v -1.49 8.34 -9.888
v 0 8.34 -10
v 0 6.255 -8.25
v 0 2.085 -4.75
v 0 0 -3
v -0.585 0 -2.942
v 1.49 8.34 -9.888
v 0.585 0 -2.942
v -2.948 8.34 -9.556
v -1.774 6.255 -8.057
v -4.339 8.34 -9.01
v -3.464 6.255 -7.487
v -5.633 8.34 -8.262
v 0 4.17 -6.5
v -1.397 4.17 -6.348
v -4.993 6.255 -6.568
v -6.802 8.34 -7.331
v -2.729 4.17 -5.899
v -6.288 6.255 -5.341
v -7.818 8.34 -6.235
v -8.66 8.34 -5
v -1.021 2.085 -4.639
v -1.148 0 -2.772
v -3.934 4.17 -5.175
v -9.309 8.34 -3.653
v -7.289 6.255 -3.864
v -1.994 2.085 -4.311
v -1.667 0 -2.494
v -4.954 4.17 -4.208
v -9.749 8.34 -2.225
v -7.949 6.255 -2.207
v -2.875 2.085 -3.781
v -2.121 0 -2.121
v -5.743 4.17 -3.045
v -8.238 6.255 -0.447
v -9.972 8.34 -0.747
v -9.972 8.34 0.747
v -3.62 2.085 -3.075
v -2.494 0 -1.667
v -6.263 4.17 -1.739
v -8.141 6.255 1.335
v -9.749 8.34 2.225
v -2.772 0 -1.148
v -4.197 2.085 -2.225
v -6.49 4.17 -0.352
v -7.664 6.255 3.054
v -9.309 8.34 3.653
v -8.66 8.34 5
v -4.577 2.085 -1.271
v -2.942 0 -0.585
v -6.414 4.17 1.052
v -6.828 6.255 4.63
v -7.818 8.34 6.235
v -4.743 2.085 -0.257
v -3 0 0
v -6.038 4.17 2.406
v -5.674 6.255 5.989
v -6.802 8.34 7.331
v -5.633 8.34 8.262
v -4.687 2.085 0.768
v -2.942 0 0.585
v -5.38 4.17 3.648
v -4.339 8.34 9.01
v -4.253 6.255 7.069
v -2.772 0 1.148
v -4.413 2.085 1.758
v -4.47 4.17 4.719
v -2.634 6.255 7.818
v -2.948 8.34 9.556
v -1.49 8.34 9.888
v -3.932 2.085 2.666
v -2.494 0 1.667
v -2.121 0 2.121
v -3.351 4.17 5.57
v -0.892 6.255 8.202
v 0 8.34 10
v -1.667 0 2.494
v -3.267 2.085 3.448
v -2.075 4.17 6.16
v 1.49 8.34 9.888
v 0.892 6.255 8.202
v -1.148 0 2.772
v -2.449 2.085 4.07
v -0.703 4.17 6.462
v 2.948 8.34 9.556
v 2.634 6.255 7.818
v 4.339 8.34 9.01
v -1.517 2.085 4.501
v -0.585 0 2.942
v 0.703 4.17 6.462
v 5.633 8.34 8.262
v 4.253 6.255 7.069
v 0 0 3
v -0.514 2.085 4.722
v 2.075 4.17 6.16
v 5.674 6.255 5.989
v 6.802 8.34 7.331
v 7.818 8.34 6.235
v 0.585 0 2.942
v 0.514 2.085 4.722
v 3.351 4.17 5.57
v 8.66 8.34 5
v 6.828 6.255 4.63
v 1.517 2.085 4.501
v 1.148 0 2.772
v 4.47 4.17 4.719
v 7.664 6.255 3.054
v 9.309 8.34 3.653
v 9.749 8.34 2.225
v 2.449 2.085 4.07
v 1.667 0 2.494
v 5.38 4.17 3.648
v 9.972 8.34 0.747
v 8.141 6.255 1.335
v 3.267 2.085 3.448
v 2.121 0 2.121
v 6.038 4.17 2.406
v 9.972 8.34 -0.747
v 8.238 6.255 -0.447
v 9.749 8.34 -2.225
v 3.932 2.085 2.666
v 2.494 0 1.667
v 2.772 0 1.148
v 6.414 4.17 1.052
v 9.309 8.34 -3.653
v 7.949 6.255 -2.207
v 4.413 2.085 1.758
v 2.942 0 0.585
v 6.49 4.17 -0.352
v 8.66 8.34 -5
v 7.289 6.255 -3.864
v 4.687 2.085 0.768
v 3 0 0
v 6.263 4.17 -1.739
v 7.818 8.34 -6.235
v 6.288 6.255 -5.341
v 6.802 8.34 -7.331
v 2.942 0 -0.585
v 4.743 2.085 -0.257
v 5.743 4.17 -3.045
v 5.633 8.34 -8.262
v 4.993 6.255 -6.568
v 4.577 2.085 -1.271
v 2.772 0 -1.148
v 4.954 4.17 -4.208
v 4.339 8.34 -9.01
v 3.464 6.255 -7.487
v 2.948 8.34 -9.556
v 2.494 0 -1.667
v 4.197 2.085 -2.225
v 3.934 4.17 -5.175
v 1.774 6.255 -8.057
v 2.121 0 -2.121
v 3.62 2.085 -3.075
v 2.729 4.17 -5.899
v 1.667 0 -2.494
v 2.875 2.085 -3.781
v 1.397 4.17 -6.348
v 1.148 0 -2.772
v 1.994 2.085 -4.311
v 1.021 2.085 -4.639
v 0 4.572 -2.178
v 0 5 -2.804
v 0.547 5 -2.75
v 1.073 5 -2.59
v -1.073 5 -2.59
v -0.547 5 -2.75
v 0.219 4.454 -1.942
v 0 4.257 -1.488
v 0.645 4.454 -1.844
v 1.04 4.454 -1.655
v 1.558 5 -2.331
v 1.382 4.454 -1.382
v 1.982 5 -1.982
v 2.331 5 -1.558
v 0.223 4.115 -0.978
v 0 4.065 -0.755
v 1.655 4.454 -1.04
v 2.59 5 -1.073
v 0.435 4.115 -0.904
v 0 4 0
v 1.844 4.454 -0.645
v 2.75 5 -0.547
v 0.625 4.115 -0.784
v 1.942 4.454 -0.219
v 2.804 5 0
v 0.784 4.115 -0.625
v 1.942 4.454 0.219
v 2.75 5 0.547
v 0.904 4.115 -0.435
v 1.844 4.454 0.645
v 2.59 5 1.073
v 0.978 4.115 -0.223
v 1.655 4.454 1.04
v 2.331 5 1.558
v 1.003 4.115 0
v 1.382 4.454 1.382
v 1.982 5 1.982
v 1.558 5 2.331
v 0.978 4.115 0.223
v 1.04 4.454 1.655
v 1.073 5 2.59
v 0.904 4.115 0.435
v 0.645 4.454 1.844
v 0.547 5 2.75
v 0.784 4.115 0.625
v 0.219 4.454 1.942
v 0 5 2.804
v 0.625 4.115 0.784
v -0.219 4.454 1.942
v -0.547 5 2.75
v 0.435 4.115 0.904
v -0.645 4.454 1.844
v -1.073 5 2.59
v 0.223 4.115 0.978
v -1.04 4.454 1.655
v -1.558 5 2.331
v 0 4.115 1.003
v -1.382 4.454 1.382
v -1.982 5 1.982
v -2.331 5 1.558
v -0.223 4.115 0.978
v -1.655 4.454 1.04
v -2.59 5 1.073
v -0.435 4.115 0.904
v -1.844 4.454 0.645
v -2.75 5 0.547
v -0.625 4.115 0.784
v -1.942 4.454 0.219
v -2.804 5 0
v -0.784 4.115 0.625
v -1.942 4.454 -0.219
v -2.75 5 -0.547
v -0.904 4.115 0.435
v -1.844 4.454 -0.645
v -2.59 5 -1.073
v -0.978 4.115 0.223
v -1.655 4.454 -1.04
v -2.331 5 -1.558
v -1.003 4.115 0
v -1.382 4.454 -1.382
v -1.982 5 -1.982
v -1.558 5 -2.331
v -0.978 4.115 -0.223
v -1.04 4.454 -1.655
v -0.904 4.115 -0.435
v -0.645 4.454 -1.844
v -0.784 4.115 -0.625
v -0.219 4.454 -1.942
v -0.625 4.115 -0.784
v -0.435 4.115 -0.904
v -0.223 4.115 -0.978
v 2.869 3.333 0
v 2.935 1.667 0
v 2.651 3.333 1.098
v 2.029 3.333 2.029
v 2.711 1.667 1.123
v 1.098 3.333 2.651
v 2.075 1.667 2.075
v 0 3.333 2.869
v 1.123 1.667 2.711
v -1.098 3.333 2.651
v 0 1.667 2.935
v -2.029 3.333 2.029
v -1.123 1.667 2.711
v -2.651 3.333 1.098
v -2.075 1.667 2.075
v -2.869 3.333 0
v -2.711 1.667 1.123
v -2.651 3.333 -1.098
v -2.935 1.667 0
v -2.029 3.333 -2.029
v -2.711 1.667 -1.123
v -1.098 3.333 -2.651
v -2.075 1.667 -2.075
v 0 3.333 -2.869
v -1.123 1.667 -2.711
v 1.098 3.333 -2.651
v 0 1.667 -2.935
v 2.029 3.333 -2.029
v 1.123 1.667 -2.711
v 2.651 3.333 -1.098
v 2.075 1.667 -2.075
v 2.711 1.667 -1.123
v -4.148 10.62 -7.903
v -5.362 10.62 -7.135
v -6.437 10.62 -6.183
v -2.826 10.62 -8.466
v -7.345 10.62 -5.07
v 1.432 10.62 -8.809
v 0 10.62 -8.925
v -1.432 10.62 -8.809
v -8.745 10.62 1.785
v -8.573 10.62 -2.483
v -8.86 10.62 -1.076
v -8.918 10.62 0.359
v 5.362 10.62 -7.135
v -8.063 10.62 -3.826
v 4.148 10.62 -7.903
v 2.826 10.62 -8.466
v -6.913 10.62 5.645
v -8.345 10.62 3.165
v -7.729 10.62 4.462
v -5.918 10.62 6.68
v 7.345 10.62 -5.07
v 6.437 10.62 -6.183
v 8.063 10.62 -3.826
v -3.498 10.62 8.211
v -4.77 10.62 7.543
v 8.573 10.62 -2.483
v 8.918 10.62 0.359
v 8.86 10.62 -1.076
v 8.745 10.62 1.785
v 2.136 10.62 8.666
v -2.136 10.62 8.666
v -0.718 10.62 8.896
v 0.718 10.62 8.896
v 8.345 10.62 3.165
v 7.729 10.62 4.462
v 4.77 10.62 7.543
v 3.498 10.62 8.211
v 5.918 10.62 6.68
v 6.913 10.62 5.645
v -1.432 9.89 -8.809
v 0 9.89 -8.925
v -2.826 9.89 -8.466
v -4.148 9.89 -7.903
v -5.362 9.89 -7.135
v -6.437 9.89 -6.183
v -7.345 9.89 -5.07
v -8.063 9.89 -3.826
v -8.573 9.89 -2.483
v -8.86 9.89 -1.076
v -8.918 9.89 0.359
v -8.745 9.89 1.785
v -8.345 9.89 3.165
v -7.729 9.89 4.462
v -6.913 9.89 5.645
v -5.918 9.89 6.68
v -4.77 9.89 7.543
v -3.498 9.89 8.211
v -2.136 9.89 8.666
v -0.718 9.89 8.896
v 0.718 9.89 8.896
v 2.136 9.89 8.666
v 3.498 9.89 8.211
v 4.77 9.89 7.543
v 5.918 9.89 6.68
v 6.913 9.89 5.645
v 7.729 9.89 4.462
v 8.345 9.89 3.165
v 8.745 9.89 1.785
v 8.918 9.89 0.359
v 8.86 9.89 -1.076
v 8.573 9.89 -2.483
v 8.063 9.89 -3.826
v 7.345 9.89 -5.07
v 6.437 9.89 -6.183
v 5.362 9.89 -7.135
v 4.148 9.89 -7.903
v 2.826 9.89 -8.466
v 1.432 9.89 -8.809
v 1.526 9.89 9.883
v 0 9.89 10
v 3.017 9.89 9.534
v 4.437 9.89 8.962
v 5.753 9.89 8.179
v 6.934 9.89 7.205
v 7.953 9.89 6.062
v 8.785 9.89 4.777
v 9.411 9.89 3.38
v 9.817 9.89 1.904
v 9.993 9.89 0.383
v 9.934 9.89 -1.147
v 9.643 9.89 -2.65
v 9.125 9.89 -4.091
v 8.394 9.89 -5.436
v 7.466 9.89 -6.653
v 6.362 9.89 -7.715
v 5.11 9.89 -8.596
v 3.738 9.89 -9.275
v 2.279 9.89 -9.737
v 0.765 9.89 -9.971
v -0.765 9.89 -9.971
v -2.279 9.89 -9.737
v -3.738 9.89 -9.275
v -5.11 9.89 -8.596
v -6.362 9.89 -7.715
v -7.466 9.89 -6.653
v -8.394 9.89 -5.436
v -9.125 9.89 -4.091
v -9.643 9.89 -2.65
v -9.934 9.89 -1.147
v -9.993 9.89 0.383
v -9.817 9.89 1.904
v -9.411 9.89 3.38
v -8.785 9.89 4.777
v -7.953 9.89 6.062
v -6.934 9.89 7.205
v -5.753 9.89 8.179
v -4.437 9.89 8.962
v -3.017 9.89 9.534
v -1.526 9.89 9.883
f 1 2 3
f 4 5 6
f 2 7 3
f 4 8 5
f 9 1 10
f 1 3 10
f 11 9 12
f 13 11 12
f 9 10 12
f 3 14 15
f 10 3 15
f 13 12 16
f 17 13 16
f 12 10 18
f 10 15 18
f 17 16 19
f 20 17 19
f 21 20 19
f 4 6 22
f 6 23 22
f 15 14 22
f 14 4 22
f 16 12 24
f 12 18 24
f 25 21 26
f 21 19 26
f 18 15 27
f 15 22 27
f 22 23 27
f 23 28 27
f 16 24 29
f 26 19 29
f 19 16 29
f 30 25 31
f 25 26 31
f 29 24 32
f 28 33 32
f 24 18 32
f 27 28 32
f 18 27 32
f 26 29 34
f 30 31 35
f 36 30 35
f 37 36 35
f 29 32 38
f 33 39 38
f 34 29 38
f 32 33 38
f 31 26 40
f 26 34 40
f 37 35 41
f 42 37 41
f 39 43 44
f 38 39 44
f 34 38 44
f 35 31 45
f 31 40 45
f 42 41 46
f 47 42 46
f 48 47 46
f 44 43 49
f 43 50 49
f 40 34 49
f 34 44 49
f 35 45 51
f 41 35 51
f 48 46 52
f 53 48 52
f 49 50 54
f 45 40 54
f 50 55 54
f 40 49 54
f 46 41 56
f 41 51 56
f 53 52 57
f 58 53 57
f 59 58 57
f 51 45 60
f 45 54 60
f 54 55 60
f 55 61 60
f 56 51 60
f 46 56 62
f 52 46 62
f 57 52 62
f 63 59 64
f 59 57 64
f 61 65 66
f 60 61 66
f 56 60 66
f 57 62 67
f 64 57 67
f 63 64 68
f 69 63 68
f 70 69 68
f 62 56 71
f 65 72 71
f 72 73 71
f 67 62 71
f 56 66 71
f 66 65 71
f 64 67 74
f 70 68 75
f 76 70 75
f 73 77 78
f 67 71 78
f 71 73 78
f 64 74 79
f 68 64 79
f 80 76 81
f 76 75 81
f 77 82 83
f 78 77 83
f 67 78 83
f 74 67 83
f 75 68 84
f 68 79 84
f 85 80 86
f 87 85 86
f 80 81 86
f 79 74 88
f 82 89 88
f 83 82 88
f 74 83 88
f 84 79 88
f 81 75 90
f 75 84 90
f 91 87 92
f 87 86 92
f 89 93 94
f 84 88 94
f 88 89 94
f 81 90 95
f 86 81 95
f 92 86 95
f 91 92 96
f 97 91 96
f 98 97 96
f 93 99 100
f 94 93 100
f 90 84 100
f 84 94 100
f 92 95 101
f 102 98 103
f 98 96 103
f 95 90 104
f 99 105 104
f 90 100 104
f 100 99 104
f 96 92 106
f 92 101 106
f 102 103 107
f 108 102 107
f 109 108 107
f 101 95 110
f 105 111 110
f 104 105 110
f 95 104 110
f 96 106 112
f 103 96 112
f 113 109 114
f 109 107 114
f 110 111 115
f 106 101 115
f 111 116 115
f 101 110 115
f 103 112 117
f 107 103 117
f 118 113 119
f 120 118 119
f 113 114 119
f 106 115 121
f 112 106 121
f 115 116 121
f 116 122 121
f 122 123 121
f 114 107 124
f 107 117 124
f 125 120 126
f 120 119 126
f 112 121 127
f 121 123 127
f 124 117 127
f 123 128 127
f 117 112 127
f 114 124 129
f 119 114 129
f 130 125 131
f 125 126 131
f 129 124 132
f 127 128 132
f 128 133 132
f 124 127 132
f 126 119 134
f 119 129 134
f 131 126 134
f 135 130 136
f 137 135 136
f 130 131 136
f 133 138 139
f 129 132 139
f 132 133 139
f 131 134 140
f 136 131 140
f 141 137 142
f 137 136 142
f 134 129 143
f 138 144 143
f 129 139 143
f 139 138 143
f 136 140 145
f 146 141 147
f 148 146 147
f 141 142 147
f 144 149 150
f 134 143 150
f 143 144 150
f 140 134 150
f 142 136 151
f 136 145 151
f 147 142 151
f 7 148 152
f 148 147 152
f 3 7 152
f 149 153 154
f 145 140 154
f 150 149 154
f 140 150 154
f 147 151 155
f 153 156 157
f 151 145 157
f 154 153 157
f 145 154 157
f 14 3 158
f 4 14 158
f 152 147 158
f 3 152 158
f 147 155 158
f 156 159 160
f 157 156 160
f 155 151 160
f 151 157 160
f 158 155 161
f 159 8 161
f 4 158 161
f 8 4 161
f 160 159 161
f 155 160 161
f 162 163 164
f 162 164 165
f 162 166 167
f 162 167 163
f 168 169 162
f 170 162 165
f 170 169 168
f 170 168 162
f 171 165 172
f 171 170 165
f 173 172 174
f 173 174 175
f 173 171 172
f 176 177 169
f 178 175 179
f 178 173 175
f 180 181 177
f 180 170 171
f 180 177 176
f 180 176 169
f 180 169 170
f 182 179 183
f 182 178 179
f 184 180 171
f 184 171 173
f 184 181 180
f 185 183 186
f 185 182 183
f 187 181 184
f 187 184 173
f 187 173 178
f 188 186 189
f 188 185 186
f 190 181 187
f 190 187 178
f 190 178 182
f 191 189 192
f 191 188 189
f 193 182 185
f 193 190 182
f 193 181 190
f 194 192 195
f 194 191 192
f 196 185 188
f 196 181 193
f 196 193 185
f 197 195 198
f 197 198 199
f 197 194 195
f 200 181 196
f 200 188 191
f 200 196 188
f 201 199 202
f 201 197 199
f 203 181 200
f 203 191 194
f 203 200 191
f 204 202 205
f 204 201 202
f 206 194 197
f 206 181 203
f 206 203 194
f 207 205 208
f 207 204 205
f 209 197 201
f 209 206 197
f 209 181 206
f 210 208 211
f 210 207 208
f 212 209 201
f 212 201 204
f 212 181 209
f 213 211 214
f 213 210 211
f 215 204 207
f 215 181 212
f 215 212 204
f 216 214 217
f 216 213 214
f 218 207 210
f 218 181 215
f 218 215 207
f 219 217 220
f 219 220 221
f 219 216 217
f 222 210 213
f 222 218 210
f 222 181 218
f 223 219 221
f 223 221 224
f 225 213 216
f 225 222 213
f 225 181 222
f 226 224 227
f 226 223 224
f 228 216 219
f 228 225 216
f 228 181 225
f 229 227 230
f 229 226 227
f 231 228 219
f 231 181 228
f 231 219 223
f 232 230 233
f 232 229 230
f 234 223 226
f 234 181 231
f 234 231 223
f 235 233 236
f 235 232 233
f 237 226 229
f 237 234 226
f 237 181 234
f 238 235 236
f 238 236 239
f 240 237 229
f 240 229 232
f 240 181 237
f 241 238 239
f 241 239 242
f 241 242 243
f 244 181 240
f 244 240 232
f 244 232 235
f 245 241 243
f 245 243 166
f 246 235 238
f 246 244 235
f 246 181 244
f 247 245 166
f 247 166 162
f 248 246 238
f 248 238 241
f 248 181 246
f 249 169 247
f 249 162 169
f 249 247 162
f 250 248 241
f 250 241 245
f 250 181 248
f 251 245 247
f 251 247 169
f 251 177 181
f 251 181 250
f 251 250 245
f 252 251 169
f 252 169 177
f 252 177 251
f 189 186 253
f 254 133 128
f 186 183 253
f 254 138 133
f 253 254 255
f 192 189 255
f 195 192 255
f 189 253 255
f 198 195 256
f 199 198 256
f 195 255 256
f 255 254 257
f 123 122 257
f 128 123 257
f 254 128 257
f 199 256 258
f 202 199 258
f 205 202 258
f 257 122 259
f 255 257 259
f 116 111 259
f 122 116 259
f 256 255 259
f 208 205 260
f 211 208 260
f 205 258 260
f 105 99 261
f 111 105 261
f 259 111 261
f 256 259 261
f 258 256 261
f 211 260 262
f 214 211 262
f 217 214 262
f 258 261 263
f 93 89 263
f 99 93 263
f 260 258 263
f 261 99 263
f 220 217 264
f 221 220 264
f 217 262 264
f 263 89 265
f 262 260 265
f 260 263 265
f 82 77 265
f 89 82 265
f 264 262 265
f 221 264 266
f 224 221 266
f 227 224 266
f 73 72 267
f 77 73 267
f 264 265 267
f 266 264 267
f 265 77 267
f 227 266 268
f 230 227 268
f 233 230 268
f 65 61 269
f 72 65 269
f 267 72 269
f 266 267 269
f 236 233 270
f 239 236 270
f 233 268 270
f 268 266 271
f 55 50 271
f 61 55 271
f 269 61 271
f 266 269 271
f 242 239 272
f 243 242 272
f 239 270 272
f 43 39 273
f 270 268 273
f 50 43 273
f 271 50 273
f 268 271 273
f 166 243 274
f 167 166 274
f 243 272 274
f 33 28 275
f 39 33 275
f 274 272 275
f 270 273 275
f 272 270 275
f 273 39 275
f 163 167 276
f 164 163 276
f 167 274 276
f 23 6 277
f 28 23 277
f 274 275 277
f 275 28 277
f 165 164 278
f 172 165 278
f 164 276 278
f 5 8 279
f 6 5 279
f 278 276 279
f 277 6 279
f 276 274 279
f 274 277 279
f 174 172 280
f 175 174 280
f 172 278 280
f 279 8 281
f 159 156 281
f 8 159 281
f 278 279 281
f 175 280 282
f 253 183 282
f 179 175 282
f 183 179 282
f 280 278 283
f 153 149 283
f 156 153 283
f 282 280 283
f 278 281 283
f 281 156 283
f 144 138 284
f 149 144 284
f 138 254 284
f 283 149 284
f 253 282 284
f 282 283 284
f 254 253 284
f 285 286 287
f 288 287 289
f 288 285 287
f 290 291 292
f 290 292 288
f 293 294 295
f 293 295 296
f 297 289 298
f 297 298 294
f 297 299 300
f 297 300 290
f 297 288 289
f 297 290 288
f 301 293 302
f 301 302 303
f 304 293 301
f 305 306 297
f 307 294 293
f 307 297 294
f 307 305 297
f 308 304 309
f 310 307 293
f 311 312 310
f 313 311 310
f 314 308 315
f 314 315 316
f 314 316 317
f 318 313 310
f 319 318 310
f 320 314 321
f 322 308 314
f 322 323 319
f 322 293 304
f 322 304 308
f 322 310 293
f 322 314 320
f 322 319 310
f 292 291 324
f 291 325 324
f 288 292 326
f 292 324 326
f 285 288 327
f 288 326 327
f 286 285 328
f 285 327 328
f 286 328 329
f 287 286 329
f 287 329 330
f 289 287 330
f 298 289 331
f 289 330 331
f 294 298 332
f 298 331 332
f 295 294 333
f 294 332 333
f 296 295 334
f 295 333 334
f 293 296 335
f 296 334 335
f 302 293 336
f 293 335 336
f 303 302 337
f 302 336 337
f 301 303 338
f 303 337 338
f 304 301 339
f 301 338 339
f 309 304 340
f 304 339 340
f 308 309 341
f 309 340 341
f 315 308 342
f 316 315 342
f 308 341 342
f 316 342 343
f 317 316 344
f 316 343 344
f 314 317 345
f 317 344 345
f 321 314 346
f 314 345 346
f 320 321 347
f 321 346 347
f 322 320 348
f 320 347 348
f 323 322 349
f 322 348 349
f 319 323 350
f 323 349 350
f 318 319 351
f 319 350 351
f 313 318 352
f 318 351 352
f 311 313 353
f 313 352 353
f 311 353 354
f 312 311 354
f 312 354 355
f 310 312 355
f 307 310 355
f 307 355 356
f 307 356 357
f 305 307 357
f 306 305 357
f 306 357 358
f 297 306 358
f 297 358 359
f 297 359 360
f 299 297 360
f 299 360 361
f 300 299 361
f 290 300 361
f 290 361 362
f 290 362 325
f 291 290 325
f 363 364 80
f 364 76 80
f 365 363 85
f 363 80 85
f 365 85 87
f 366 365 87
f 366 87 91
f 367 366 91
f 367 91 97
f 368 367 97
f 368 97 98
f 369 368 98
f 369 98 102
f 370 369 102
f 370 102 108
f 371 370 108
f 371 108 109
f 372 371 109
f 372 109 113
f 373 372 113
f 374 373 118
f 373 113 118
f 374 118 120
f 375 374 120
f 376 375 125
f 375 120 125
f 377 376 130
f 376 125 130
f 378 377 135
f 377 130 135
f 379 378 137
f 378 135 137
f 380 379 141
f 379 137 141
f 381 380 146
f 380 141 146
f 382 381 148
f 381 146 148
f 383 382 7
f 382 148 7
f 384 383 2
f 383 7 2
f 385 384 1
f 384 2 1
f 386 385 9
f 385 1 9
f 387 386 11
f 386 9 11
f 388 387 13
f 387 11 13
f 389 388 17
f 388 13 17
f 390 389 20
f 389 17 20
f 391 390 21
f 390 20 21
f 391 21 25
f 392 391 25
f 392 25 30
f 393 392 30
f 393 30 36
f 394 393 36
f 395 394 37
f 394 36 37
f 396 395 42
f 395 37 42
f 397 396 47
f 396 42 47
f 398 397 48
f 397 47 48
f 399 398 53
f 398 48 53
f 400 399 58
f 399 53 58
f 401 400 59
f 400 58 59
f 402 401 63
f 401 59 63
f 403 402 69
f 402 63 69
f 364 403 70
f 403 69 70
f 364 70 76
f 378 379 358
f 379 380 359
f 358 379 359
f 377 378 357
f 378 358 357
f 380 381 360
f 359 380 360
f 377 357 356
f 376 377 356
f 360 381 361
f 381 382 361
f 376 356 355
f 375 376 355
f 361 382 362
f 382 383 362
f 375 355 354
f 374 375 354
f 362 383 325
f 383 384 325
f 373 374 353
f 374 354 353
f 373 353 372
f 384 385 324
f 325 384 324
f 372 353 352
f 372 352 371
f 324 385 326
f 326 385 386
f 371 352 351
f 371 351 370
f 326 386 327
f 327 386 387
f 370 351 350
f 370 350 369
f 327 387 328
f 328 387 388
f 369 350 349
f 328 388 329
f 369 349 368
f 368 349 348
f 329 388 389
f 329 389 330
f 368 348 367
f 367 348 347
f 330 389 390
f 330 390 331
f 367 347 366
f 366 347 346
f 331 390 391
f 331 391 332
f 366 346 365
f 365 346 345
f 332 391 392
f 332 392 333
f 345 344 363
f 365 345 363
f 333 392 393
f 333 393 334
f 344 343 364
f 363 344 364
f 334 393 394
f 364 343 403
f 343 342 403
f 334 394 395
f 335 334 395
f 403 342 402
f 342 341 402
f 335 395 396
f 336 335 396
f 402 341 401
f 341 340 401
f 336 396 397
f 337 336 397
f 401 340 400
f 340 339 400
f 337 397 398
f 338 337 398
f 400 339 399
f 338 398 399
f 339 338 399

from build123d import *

# Parameters (mm, degrees)
SKETCH1_R           = 10
BOSS_EXTRUDE1_DEPTH = 10.62
SKETCH3_R           = 3
CUT_EXTRUDE1_DEPTH  = 5
CUT_EXTRUDE1_DRAFT  = -2.25
DOME1_FACE_RADIUS   = 2.803549465
DOME1_HEIGHT        = 1


with BuildPart() as part:
    # Sketch1 → Boss-Extrude1 (new body)
    with BuildSketch(Plane(origin=(0, 0, 0), x_dir=(1, 0, 0), z_dir=(0, 1, 0))):
        with Locations(Location((0, 0, 0), (0, 0, 270))):
            Circle(SKETCH1_R)
    extrude(amount=BOSS_EXTRUDE1_DEPTH)

    # Sketch2 → Cut-Revolve1 (revolve, cut)
    with BuildSketch(Plane(origin=(0, 0, 0), x_dir=(0, 0, -1), z_dir=(1, 0, 0))):
        Polygon((11, 9.89), (10, 9.89), (10, 8.34), (3, 0), (11, 0), align=None)
        Polygon((11, 10.62), (8.925, 10.62), (8.925, 9.89), (10, 9.89), (11, 9.89), align=None)
    revolve(axis=Axis((0, 0, 0), (0, 1, 0)), mode=Mode.SUBTRACT)


with BuildPart() as cut_extrude1_tool:
    # Sketch3 → Cut-Extrude1 (with draft: the straight prism first)
    with BuildSketch(Plane.XZ):
        Circle(SKETCH3_R)
    extrude(amount=-CUT_EXTRUDE1_DEPTH)
    # Cut-Extrude1: the draft: its side faces are tilted about the plane it starts from
    cut_extrude1_sides = [cut_extrude1_tool.faces().sort_by_distance(p)[0] for p in [
        (-3, 2.5, 0),
    ]]
    draft(cut_extrude1_sides, Plane.XZ, CUT_EXTRUDE1_DRAFT)


with BuildPart() as part_1:
    add(part.part)

    # Cut-Extrude1: cut by cut_extrude1_tool
    add(cut_extrude1_tool.part, mode=Mode.SUBTRACT)

    # Dome1: a dome of height H over a round flat face of radius A is a cap of a sphere of radius (A * A + H * H) / (2 * H)
    dome1_r = (DOME1_FACE_RADIUS * DOME1_FACE_RADIUS + DOME1_HEIGHT * DOME1_HEIGHT) / (2 * DOME1_HEIGHT)
    dome1_base = Plane((0, 5, 0), z_dir=(0, -1, 0))
    with Locations(dome1_base.offset(DOME1_HEIGHT - dome1_r)):
        dome1_ball = Sphere(dome1_r, mode=Mode.PRIVATE)
    add(split(dome1_ball, bisect_by=dome1_base, keep=Keep.TOP, mode=Mode.PRIVATE))


solid = part_1.part
